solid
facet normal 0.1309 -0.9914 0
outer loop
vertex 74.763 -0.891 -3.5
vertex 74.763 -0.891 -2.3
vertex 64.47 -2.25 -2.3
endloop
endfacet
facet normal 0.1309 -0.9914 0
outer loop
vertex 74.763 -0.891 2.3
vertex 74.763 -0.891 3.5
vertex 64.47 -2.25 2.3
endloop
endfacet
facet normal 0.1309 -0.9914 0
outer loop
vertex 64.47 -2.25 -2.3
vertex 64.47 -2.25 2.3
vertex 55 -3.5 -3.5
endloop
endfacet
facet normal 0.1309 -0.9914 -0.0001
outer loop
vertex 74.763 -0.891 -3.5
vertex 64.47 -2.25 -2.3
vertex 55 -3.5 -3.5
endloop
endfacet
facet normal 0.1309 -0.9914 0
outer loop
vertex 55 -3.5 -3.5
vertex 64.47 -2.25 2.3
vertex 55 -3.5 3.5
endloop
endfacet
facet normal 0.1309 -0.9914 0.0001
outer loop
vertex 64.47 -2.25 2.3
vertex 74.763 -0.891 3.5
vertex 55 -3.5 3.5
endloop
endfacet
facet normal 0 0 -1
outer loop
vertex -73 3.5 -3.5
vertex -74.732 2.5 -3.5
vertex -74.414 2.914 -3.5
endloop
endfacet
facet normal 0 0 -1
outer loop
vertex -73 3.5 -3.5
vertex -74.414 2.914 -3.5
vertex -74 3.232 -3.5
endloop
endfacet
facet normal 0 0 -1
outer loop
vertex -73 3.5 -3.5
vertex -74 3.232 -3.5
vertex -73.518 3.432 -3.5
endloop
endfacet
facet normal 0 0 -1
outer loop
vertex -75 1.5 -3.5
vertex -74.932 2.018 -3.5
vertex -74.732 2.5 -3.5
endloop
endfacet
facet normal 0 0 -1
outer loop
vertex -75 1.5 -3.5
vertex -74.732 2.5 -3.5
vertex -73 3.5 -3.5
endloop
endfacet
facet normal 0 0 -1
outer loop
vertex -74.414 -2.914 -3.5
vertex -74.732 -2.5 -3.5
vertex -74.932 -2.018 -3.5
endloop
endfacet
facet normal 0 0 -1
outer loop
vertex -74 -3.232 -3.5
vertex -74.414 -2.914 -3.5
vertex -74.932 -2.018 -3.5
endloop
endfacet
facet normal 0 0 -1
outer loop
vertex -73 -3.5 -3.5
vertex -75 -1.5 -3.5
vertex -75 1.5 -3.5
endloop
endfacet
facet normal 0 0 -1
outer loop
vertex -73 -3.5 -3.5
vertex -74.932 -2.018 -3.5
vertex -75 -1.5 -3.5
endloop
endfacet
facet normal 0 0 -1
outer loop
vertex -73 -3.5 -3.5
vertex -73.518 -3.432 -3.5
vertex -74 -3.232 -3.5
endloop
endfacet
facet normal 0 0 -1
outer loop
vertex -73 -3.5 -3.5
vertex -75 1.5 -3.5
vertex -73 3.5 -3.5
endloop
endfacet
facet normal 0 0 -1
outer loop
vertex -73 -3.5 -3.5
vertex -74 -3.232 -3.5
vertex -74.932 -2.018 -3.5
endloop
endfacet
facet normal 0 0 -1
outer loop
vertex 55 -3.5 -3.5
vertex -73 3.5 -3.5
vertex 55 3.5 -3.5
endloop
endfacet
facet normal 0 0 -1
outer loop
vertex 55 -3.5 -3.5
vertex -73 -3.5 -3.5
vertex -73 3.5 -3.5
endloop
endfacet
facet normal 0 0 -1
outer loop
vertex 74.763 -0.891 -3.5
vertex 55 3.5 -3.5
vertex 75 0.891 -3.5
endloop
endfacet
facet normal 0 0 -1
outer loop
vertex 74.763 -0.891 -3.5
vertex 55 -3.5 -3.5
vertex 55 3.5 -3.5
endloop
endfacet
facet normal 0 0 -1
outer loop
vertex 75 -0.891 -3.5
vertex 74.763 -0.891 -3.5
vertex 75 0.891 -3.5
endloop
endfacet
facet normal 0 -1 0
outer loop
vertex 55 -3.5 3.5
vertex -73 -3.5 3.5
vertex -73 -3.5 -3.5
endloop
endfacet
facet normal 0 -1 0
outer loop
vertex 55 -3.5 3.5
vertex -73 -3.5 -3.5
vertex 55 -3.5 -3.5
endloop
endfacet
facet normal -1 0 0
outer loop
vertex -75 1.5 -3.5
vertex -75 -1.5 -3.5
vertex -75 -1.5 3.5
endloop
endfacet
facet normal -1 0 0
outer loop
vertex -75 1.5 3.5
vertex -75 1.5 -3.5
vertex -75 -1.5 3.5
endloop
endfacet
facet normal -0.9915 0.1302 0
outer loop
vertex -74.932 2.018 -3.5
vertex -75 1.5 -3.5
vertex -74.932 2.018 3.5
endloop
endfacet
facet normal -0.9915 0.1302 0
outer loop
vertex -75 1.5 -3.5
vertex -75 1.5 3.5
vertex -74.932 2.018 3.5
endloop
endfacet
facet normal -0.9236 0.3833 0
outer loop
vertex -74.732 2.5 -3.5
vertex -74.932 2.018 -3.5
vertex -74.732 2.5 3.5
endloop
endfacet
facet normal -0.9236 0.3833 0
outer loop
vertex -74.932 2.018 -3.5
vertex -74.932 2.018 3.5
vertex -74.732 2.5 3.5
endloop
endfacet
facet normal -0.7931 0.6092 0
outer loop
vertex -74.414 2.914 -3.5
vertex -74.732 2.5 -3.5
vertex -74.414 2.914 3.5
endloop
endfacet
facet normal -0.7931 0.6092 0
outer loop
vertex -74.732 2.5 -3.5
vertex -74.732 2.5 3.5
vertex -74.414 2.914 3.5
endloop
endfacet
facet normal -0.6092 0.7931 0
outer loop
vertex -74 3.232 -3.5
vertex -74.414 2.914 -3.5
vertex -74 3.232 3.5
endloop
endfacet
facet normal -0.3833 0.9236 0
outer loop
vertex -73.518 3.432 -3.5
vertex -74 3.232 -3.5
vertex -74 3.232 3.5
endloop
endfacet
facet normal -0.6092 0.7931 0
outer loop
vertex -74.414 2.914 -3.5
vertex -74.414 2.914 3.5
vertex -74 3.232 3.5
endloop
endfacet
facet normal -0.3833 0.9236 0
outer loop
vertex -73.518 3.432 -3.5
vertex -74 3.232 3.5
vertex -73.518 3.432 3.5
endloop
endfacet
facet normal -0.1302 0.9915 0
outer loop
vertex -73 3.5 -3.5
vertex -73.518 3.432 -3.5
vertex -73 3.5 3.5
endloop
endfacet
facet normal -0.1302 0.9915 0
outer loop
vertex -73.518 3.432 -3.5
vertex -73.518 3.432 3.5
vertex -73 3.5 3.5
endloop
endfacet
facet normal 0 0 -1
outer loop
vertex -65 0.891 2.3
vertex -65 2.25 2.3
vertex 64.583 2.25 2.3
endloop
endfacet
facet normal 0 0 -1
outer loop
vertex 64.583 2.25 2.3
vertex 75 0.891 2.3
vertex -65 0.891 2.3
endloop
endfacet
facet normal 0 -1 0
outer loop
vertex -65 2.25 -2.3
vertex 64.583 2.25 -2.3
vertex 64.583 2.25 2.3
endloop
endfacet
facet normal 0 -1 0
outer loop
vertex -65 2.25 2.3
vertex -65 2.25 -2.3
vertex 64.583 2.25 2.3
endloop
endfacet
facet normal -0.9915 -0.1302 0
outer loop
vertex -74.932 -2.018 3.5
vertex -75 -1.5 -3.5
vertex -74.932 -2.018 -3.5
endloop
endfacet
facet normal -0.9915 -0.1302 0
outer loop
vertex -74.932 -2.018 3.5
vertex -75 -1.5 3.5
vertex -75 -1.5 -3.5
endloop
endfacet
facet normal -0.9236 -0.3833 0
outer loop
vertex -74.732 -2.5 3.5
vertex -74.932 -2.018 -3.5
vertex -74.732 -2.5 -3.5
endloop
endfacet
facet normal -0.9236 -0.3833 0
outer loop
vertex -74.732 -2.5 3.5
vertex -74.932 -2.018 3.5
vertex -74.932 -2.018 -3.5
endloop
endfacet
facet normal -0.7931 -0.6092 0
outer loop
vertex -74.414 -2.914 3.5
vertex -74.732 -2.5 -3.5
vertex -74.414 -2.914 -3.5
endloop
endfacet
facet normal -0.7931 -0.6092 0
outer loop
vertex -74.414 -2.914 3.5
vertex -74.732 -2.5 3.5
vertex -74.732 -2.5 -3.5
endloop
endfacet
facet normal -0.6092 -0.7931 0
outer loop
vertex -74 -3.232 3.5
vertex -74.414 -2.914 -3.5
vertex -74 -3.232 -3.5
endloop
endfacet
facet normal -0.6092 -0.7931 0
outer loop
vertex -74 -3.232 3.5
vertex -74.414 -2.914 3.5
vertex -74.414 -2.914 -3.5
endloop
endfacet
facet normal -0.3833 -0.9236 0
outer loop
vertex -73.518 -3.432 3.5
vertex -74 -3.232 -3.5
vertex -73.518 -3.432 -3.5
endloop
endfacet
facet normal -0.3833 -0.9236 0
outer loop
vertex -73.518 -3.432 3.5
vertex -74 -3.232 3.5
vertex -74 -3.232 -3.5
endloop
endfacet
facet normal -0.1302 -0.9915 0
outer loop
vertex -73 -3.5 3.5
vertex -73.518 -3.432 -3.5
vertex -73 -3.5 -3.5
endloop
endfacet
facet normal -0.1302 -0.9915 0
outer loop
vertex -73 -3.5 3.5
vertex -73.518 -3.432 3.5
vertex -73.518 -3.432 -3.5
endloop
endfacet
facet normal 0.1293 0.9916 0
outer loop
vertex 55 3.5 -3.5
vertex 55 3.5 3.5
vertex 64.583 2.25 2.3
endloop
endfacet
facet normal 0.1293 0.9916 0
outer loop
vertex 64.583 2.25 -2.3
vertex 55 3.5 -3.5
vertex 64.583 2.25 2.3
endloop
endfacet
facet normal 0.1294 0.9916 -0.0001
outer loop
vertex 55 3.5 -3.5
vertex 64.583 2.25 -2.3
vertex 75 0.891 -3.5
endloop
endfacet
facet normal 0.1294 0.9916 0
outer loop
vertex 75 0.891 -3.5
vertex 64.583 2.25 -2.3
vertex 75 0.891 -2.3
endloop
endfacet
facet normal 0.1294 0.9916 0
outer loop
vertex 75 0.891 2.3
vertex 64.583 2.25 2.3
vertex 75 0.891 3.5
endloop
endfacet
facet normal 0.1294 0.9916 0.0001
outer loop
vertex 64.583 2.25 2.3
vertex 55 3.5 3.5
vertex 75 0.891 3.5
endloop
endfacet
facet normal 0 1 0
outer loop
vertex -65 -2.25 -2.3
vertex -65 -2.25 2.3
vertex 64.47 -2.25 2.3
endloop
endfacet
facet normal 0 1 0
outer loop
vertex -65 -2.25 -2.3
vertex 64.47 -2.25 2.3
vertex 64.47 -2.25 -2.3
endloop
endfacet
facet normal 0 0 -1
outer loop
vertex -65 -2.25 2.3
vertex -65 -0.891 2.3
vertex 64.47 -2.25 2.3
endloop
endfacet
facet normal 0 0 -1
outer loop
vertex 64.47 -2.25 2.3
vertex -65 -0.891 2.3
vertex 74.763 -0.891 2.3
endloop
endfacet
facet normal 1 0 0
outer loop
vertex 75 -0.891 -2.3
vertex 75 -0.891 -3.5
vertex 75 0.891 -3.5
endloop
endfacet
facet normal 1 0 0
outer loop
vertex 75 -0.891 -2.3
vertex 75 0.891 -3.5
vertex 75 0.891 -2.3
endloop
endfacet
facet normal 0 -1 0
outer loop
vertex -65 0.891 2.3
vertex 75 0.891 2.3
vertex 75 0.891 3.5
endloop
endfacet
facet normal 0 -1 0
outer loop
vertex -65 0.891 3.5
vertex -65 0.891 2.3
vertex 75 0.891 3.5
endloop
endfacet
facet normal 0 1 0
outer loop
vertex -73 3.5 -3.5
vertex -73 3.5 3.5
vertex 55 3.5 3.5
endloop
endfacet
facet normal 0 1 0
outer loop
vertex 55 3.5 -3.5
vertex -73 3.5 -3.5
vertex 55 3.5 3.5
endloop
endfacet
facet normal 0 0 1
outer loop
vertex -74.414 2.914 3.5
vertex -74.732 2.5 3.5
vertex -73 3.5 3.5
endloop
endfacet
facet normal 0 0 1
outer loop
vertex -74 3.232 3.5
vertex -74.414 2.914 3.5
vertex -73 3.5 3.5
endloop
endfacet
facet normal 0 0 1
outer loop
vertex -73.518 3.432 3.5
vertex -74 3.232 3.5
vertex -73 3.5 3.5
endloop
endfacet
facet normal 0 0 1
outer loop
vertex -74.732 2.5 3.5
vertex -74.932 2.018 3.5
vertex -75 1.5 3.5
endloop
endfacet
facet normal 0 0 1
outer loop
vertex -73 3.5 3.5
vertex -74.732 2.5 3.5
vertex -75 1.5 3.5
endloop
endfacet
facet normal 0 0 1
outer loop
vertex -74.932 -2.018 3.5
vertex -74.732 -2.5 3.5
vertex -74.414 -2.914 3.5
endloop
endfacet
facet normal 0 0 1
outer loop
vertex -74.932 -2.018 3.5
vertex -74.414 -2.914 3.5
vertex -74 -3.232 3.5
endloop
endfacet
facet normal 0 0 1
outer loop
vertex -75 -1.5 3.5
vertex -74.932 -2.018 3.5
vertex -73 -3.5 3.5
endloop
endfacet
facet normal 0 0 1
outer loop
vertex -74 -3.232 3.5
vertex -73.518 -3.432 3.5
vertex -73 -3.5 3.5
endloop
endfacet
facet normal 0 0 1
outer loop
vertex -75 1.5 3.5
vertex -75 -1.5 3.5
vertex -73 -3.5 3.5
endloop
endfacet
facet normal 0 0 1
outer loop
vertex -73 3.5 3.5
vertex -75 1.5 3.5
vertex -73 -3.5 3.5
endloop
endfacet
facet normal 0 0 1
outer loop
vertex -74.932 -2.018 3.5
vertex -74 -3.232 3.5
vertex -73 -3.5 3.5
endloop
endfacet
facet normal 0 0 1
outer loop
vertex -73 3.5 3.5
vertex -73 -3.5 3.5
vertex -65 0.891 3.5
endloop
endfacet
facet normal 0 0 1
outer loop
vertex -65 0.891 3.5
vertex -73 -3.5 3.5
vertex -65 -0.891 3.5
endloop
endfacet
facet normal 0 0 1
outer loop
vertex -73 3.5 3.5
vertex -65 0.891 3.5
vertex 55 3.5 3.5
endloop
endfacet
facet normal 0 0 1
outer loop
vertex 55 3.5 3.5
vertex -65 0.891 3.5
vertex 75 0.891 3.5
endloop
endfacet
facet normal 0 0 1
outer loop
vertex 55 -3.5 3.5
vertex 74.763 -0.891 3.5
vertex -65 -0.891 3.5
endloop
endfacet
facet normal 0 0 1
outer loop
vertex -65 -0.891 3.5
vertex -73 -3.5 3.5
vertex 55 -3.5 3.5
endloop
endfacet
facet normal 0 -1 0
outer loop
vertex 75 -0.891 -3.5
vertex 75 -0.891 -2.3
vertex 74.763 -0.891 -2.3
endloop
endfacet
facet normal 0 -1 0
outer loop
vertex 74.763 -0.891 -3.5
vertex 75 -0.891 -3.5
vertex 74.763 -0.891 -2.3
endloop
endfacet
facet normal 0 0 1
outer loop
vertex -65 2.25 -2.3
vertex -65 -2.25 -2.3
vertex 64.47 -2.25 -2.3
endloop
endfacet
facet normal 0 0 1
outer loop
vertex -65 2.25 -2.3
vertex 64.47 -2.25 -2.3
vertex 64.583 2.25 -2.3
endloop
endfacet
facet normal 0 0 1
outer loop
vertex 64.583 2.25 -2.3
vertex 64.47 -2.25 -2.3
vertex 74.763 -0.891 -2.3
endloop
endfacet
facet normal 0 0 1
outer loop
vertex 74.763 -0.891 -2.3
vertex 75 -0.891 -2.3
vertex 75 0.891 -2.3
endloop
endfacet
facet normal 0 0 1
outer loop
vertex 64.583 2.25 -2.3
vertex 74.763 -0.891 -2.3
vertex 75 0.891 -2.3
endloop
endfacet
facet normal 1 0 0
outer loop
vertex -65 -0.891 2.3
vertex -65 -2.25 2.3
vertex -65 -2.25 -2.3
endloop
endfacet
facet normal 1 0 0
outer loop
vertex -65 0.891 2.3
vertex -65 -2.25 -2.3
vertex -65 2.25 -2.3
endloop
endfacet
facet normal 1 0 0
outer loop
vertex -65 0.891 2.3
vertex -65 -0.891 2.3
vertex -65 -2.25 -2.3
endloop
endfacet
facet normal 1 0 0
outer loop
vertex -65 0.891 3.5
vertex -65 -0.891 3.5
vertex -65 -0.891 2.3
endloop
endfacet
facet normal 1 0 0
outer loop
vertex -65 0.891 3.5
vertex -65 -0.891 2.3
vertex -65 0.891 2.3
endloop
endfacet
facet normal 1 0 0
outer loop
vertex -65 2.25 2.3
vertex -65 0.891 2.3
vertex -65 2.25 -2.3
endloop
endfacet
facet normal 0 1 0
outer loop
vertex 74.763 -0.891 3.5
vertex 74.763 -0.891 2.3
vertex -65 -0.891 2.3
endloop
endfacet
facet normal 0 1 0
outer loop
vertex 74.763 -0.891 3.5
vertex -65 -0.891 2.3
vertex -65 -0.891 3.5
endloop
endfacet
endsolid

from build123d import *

# Parameters (mm, degrees)
F0_W     = 150
F0_H     = 7
F1_DEPTH = 3.5
F2_W     = 1.7826502014
F2_H     = 1.2
F3_DEPTH = 140
F4_R     = 2
F6_DEPTH = 7.001


with BuildPart() as f1:
    # F0 (on Front) → F1 (new body, symmetric)
    with BuildSketch(Plane.XZ):
        Rectangle(F0_W, F0_H)
    extrude(amount=F1_DEPTH, both=True)

    # F2 (on face) → F3 (cut)
    with BuildSketch(Plane.YZ.offset(75)):
        with Locations((0, 2.9)):
            Rectangle(F2_W, F2_H)
        Polygon((-2.25, 2.3), (-2.25, -2.3), (2.25, -2.3), (2.25, 2.3), (0.8913251007, 2.3), (-0.8913251007, 2.3), align=None)
    extrude(amount=-F3_DEPTH, mode=Mode.SUBTRACT)

    # F4
    f4_edges = [f1.edges().sort_by_distance(p)[0] for p in [
        (-75, 3.5, 0),
        (-75, -3.5, 0),
    ]]
    fillet(f4_edges, radius=F4_R)

    # F5 (on face) → F6 (cut, through all)
    with BuildSketch(Plane.XY.offset(3.5)):
        Polygon((75, 3.5), (55, 3.5), (75, 0.8913251007), align=None)
        Polygon((75, -0.8913251007), (74.7628584504, -0.8913251007), (55, -3.5), (75, -3.5), align=None)
    extrude(amount=-F6_DEPTH, mode=Mode.SUBTRACT)


solid = f1.part
